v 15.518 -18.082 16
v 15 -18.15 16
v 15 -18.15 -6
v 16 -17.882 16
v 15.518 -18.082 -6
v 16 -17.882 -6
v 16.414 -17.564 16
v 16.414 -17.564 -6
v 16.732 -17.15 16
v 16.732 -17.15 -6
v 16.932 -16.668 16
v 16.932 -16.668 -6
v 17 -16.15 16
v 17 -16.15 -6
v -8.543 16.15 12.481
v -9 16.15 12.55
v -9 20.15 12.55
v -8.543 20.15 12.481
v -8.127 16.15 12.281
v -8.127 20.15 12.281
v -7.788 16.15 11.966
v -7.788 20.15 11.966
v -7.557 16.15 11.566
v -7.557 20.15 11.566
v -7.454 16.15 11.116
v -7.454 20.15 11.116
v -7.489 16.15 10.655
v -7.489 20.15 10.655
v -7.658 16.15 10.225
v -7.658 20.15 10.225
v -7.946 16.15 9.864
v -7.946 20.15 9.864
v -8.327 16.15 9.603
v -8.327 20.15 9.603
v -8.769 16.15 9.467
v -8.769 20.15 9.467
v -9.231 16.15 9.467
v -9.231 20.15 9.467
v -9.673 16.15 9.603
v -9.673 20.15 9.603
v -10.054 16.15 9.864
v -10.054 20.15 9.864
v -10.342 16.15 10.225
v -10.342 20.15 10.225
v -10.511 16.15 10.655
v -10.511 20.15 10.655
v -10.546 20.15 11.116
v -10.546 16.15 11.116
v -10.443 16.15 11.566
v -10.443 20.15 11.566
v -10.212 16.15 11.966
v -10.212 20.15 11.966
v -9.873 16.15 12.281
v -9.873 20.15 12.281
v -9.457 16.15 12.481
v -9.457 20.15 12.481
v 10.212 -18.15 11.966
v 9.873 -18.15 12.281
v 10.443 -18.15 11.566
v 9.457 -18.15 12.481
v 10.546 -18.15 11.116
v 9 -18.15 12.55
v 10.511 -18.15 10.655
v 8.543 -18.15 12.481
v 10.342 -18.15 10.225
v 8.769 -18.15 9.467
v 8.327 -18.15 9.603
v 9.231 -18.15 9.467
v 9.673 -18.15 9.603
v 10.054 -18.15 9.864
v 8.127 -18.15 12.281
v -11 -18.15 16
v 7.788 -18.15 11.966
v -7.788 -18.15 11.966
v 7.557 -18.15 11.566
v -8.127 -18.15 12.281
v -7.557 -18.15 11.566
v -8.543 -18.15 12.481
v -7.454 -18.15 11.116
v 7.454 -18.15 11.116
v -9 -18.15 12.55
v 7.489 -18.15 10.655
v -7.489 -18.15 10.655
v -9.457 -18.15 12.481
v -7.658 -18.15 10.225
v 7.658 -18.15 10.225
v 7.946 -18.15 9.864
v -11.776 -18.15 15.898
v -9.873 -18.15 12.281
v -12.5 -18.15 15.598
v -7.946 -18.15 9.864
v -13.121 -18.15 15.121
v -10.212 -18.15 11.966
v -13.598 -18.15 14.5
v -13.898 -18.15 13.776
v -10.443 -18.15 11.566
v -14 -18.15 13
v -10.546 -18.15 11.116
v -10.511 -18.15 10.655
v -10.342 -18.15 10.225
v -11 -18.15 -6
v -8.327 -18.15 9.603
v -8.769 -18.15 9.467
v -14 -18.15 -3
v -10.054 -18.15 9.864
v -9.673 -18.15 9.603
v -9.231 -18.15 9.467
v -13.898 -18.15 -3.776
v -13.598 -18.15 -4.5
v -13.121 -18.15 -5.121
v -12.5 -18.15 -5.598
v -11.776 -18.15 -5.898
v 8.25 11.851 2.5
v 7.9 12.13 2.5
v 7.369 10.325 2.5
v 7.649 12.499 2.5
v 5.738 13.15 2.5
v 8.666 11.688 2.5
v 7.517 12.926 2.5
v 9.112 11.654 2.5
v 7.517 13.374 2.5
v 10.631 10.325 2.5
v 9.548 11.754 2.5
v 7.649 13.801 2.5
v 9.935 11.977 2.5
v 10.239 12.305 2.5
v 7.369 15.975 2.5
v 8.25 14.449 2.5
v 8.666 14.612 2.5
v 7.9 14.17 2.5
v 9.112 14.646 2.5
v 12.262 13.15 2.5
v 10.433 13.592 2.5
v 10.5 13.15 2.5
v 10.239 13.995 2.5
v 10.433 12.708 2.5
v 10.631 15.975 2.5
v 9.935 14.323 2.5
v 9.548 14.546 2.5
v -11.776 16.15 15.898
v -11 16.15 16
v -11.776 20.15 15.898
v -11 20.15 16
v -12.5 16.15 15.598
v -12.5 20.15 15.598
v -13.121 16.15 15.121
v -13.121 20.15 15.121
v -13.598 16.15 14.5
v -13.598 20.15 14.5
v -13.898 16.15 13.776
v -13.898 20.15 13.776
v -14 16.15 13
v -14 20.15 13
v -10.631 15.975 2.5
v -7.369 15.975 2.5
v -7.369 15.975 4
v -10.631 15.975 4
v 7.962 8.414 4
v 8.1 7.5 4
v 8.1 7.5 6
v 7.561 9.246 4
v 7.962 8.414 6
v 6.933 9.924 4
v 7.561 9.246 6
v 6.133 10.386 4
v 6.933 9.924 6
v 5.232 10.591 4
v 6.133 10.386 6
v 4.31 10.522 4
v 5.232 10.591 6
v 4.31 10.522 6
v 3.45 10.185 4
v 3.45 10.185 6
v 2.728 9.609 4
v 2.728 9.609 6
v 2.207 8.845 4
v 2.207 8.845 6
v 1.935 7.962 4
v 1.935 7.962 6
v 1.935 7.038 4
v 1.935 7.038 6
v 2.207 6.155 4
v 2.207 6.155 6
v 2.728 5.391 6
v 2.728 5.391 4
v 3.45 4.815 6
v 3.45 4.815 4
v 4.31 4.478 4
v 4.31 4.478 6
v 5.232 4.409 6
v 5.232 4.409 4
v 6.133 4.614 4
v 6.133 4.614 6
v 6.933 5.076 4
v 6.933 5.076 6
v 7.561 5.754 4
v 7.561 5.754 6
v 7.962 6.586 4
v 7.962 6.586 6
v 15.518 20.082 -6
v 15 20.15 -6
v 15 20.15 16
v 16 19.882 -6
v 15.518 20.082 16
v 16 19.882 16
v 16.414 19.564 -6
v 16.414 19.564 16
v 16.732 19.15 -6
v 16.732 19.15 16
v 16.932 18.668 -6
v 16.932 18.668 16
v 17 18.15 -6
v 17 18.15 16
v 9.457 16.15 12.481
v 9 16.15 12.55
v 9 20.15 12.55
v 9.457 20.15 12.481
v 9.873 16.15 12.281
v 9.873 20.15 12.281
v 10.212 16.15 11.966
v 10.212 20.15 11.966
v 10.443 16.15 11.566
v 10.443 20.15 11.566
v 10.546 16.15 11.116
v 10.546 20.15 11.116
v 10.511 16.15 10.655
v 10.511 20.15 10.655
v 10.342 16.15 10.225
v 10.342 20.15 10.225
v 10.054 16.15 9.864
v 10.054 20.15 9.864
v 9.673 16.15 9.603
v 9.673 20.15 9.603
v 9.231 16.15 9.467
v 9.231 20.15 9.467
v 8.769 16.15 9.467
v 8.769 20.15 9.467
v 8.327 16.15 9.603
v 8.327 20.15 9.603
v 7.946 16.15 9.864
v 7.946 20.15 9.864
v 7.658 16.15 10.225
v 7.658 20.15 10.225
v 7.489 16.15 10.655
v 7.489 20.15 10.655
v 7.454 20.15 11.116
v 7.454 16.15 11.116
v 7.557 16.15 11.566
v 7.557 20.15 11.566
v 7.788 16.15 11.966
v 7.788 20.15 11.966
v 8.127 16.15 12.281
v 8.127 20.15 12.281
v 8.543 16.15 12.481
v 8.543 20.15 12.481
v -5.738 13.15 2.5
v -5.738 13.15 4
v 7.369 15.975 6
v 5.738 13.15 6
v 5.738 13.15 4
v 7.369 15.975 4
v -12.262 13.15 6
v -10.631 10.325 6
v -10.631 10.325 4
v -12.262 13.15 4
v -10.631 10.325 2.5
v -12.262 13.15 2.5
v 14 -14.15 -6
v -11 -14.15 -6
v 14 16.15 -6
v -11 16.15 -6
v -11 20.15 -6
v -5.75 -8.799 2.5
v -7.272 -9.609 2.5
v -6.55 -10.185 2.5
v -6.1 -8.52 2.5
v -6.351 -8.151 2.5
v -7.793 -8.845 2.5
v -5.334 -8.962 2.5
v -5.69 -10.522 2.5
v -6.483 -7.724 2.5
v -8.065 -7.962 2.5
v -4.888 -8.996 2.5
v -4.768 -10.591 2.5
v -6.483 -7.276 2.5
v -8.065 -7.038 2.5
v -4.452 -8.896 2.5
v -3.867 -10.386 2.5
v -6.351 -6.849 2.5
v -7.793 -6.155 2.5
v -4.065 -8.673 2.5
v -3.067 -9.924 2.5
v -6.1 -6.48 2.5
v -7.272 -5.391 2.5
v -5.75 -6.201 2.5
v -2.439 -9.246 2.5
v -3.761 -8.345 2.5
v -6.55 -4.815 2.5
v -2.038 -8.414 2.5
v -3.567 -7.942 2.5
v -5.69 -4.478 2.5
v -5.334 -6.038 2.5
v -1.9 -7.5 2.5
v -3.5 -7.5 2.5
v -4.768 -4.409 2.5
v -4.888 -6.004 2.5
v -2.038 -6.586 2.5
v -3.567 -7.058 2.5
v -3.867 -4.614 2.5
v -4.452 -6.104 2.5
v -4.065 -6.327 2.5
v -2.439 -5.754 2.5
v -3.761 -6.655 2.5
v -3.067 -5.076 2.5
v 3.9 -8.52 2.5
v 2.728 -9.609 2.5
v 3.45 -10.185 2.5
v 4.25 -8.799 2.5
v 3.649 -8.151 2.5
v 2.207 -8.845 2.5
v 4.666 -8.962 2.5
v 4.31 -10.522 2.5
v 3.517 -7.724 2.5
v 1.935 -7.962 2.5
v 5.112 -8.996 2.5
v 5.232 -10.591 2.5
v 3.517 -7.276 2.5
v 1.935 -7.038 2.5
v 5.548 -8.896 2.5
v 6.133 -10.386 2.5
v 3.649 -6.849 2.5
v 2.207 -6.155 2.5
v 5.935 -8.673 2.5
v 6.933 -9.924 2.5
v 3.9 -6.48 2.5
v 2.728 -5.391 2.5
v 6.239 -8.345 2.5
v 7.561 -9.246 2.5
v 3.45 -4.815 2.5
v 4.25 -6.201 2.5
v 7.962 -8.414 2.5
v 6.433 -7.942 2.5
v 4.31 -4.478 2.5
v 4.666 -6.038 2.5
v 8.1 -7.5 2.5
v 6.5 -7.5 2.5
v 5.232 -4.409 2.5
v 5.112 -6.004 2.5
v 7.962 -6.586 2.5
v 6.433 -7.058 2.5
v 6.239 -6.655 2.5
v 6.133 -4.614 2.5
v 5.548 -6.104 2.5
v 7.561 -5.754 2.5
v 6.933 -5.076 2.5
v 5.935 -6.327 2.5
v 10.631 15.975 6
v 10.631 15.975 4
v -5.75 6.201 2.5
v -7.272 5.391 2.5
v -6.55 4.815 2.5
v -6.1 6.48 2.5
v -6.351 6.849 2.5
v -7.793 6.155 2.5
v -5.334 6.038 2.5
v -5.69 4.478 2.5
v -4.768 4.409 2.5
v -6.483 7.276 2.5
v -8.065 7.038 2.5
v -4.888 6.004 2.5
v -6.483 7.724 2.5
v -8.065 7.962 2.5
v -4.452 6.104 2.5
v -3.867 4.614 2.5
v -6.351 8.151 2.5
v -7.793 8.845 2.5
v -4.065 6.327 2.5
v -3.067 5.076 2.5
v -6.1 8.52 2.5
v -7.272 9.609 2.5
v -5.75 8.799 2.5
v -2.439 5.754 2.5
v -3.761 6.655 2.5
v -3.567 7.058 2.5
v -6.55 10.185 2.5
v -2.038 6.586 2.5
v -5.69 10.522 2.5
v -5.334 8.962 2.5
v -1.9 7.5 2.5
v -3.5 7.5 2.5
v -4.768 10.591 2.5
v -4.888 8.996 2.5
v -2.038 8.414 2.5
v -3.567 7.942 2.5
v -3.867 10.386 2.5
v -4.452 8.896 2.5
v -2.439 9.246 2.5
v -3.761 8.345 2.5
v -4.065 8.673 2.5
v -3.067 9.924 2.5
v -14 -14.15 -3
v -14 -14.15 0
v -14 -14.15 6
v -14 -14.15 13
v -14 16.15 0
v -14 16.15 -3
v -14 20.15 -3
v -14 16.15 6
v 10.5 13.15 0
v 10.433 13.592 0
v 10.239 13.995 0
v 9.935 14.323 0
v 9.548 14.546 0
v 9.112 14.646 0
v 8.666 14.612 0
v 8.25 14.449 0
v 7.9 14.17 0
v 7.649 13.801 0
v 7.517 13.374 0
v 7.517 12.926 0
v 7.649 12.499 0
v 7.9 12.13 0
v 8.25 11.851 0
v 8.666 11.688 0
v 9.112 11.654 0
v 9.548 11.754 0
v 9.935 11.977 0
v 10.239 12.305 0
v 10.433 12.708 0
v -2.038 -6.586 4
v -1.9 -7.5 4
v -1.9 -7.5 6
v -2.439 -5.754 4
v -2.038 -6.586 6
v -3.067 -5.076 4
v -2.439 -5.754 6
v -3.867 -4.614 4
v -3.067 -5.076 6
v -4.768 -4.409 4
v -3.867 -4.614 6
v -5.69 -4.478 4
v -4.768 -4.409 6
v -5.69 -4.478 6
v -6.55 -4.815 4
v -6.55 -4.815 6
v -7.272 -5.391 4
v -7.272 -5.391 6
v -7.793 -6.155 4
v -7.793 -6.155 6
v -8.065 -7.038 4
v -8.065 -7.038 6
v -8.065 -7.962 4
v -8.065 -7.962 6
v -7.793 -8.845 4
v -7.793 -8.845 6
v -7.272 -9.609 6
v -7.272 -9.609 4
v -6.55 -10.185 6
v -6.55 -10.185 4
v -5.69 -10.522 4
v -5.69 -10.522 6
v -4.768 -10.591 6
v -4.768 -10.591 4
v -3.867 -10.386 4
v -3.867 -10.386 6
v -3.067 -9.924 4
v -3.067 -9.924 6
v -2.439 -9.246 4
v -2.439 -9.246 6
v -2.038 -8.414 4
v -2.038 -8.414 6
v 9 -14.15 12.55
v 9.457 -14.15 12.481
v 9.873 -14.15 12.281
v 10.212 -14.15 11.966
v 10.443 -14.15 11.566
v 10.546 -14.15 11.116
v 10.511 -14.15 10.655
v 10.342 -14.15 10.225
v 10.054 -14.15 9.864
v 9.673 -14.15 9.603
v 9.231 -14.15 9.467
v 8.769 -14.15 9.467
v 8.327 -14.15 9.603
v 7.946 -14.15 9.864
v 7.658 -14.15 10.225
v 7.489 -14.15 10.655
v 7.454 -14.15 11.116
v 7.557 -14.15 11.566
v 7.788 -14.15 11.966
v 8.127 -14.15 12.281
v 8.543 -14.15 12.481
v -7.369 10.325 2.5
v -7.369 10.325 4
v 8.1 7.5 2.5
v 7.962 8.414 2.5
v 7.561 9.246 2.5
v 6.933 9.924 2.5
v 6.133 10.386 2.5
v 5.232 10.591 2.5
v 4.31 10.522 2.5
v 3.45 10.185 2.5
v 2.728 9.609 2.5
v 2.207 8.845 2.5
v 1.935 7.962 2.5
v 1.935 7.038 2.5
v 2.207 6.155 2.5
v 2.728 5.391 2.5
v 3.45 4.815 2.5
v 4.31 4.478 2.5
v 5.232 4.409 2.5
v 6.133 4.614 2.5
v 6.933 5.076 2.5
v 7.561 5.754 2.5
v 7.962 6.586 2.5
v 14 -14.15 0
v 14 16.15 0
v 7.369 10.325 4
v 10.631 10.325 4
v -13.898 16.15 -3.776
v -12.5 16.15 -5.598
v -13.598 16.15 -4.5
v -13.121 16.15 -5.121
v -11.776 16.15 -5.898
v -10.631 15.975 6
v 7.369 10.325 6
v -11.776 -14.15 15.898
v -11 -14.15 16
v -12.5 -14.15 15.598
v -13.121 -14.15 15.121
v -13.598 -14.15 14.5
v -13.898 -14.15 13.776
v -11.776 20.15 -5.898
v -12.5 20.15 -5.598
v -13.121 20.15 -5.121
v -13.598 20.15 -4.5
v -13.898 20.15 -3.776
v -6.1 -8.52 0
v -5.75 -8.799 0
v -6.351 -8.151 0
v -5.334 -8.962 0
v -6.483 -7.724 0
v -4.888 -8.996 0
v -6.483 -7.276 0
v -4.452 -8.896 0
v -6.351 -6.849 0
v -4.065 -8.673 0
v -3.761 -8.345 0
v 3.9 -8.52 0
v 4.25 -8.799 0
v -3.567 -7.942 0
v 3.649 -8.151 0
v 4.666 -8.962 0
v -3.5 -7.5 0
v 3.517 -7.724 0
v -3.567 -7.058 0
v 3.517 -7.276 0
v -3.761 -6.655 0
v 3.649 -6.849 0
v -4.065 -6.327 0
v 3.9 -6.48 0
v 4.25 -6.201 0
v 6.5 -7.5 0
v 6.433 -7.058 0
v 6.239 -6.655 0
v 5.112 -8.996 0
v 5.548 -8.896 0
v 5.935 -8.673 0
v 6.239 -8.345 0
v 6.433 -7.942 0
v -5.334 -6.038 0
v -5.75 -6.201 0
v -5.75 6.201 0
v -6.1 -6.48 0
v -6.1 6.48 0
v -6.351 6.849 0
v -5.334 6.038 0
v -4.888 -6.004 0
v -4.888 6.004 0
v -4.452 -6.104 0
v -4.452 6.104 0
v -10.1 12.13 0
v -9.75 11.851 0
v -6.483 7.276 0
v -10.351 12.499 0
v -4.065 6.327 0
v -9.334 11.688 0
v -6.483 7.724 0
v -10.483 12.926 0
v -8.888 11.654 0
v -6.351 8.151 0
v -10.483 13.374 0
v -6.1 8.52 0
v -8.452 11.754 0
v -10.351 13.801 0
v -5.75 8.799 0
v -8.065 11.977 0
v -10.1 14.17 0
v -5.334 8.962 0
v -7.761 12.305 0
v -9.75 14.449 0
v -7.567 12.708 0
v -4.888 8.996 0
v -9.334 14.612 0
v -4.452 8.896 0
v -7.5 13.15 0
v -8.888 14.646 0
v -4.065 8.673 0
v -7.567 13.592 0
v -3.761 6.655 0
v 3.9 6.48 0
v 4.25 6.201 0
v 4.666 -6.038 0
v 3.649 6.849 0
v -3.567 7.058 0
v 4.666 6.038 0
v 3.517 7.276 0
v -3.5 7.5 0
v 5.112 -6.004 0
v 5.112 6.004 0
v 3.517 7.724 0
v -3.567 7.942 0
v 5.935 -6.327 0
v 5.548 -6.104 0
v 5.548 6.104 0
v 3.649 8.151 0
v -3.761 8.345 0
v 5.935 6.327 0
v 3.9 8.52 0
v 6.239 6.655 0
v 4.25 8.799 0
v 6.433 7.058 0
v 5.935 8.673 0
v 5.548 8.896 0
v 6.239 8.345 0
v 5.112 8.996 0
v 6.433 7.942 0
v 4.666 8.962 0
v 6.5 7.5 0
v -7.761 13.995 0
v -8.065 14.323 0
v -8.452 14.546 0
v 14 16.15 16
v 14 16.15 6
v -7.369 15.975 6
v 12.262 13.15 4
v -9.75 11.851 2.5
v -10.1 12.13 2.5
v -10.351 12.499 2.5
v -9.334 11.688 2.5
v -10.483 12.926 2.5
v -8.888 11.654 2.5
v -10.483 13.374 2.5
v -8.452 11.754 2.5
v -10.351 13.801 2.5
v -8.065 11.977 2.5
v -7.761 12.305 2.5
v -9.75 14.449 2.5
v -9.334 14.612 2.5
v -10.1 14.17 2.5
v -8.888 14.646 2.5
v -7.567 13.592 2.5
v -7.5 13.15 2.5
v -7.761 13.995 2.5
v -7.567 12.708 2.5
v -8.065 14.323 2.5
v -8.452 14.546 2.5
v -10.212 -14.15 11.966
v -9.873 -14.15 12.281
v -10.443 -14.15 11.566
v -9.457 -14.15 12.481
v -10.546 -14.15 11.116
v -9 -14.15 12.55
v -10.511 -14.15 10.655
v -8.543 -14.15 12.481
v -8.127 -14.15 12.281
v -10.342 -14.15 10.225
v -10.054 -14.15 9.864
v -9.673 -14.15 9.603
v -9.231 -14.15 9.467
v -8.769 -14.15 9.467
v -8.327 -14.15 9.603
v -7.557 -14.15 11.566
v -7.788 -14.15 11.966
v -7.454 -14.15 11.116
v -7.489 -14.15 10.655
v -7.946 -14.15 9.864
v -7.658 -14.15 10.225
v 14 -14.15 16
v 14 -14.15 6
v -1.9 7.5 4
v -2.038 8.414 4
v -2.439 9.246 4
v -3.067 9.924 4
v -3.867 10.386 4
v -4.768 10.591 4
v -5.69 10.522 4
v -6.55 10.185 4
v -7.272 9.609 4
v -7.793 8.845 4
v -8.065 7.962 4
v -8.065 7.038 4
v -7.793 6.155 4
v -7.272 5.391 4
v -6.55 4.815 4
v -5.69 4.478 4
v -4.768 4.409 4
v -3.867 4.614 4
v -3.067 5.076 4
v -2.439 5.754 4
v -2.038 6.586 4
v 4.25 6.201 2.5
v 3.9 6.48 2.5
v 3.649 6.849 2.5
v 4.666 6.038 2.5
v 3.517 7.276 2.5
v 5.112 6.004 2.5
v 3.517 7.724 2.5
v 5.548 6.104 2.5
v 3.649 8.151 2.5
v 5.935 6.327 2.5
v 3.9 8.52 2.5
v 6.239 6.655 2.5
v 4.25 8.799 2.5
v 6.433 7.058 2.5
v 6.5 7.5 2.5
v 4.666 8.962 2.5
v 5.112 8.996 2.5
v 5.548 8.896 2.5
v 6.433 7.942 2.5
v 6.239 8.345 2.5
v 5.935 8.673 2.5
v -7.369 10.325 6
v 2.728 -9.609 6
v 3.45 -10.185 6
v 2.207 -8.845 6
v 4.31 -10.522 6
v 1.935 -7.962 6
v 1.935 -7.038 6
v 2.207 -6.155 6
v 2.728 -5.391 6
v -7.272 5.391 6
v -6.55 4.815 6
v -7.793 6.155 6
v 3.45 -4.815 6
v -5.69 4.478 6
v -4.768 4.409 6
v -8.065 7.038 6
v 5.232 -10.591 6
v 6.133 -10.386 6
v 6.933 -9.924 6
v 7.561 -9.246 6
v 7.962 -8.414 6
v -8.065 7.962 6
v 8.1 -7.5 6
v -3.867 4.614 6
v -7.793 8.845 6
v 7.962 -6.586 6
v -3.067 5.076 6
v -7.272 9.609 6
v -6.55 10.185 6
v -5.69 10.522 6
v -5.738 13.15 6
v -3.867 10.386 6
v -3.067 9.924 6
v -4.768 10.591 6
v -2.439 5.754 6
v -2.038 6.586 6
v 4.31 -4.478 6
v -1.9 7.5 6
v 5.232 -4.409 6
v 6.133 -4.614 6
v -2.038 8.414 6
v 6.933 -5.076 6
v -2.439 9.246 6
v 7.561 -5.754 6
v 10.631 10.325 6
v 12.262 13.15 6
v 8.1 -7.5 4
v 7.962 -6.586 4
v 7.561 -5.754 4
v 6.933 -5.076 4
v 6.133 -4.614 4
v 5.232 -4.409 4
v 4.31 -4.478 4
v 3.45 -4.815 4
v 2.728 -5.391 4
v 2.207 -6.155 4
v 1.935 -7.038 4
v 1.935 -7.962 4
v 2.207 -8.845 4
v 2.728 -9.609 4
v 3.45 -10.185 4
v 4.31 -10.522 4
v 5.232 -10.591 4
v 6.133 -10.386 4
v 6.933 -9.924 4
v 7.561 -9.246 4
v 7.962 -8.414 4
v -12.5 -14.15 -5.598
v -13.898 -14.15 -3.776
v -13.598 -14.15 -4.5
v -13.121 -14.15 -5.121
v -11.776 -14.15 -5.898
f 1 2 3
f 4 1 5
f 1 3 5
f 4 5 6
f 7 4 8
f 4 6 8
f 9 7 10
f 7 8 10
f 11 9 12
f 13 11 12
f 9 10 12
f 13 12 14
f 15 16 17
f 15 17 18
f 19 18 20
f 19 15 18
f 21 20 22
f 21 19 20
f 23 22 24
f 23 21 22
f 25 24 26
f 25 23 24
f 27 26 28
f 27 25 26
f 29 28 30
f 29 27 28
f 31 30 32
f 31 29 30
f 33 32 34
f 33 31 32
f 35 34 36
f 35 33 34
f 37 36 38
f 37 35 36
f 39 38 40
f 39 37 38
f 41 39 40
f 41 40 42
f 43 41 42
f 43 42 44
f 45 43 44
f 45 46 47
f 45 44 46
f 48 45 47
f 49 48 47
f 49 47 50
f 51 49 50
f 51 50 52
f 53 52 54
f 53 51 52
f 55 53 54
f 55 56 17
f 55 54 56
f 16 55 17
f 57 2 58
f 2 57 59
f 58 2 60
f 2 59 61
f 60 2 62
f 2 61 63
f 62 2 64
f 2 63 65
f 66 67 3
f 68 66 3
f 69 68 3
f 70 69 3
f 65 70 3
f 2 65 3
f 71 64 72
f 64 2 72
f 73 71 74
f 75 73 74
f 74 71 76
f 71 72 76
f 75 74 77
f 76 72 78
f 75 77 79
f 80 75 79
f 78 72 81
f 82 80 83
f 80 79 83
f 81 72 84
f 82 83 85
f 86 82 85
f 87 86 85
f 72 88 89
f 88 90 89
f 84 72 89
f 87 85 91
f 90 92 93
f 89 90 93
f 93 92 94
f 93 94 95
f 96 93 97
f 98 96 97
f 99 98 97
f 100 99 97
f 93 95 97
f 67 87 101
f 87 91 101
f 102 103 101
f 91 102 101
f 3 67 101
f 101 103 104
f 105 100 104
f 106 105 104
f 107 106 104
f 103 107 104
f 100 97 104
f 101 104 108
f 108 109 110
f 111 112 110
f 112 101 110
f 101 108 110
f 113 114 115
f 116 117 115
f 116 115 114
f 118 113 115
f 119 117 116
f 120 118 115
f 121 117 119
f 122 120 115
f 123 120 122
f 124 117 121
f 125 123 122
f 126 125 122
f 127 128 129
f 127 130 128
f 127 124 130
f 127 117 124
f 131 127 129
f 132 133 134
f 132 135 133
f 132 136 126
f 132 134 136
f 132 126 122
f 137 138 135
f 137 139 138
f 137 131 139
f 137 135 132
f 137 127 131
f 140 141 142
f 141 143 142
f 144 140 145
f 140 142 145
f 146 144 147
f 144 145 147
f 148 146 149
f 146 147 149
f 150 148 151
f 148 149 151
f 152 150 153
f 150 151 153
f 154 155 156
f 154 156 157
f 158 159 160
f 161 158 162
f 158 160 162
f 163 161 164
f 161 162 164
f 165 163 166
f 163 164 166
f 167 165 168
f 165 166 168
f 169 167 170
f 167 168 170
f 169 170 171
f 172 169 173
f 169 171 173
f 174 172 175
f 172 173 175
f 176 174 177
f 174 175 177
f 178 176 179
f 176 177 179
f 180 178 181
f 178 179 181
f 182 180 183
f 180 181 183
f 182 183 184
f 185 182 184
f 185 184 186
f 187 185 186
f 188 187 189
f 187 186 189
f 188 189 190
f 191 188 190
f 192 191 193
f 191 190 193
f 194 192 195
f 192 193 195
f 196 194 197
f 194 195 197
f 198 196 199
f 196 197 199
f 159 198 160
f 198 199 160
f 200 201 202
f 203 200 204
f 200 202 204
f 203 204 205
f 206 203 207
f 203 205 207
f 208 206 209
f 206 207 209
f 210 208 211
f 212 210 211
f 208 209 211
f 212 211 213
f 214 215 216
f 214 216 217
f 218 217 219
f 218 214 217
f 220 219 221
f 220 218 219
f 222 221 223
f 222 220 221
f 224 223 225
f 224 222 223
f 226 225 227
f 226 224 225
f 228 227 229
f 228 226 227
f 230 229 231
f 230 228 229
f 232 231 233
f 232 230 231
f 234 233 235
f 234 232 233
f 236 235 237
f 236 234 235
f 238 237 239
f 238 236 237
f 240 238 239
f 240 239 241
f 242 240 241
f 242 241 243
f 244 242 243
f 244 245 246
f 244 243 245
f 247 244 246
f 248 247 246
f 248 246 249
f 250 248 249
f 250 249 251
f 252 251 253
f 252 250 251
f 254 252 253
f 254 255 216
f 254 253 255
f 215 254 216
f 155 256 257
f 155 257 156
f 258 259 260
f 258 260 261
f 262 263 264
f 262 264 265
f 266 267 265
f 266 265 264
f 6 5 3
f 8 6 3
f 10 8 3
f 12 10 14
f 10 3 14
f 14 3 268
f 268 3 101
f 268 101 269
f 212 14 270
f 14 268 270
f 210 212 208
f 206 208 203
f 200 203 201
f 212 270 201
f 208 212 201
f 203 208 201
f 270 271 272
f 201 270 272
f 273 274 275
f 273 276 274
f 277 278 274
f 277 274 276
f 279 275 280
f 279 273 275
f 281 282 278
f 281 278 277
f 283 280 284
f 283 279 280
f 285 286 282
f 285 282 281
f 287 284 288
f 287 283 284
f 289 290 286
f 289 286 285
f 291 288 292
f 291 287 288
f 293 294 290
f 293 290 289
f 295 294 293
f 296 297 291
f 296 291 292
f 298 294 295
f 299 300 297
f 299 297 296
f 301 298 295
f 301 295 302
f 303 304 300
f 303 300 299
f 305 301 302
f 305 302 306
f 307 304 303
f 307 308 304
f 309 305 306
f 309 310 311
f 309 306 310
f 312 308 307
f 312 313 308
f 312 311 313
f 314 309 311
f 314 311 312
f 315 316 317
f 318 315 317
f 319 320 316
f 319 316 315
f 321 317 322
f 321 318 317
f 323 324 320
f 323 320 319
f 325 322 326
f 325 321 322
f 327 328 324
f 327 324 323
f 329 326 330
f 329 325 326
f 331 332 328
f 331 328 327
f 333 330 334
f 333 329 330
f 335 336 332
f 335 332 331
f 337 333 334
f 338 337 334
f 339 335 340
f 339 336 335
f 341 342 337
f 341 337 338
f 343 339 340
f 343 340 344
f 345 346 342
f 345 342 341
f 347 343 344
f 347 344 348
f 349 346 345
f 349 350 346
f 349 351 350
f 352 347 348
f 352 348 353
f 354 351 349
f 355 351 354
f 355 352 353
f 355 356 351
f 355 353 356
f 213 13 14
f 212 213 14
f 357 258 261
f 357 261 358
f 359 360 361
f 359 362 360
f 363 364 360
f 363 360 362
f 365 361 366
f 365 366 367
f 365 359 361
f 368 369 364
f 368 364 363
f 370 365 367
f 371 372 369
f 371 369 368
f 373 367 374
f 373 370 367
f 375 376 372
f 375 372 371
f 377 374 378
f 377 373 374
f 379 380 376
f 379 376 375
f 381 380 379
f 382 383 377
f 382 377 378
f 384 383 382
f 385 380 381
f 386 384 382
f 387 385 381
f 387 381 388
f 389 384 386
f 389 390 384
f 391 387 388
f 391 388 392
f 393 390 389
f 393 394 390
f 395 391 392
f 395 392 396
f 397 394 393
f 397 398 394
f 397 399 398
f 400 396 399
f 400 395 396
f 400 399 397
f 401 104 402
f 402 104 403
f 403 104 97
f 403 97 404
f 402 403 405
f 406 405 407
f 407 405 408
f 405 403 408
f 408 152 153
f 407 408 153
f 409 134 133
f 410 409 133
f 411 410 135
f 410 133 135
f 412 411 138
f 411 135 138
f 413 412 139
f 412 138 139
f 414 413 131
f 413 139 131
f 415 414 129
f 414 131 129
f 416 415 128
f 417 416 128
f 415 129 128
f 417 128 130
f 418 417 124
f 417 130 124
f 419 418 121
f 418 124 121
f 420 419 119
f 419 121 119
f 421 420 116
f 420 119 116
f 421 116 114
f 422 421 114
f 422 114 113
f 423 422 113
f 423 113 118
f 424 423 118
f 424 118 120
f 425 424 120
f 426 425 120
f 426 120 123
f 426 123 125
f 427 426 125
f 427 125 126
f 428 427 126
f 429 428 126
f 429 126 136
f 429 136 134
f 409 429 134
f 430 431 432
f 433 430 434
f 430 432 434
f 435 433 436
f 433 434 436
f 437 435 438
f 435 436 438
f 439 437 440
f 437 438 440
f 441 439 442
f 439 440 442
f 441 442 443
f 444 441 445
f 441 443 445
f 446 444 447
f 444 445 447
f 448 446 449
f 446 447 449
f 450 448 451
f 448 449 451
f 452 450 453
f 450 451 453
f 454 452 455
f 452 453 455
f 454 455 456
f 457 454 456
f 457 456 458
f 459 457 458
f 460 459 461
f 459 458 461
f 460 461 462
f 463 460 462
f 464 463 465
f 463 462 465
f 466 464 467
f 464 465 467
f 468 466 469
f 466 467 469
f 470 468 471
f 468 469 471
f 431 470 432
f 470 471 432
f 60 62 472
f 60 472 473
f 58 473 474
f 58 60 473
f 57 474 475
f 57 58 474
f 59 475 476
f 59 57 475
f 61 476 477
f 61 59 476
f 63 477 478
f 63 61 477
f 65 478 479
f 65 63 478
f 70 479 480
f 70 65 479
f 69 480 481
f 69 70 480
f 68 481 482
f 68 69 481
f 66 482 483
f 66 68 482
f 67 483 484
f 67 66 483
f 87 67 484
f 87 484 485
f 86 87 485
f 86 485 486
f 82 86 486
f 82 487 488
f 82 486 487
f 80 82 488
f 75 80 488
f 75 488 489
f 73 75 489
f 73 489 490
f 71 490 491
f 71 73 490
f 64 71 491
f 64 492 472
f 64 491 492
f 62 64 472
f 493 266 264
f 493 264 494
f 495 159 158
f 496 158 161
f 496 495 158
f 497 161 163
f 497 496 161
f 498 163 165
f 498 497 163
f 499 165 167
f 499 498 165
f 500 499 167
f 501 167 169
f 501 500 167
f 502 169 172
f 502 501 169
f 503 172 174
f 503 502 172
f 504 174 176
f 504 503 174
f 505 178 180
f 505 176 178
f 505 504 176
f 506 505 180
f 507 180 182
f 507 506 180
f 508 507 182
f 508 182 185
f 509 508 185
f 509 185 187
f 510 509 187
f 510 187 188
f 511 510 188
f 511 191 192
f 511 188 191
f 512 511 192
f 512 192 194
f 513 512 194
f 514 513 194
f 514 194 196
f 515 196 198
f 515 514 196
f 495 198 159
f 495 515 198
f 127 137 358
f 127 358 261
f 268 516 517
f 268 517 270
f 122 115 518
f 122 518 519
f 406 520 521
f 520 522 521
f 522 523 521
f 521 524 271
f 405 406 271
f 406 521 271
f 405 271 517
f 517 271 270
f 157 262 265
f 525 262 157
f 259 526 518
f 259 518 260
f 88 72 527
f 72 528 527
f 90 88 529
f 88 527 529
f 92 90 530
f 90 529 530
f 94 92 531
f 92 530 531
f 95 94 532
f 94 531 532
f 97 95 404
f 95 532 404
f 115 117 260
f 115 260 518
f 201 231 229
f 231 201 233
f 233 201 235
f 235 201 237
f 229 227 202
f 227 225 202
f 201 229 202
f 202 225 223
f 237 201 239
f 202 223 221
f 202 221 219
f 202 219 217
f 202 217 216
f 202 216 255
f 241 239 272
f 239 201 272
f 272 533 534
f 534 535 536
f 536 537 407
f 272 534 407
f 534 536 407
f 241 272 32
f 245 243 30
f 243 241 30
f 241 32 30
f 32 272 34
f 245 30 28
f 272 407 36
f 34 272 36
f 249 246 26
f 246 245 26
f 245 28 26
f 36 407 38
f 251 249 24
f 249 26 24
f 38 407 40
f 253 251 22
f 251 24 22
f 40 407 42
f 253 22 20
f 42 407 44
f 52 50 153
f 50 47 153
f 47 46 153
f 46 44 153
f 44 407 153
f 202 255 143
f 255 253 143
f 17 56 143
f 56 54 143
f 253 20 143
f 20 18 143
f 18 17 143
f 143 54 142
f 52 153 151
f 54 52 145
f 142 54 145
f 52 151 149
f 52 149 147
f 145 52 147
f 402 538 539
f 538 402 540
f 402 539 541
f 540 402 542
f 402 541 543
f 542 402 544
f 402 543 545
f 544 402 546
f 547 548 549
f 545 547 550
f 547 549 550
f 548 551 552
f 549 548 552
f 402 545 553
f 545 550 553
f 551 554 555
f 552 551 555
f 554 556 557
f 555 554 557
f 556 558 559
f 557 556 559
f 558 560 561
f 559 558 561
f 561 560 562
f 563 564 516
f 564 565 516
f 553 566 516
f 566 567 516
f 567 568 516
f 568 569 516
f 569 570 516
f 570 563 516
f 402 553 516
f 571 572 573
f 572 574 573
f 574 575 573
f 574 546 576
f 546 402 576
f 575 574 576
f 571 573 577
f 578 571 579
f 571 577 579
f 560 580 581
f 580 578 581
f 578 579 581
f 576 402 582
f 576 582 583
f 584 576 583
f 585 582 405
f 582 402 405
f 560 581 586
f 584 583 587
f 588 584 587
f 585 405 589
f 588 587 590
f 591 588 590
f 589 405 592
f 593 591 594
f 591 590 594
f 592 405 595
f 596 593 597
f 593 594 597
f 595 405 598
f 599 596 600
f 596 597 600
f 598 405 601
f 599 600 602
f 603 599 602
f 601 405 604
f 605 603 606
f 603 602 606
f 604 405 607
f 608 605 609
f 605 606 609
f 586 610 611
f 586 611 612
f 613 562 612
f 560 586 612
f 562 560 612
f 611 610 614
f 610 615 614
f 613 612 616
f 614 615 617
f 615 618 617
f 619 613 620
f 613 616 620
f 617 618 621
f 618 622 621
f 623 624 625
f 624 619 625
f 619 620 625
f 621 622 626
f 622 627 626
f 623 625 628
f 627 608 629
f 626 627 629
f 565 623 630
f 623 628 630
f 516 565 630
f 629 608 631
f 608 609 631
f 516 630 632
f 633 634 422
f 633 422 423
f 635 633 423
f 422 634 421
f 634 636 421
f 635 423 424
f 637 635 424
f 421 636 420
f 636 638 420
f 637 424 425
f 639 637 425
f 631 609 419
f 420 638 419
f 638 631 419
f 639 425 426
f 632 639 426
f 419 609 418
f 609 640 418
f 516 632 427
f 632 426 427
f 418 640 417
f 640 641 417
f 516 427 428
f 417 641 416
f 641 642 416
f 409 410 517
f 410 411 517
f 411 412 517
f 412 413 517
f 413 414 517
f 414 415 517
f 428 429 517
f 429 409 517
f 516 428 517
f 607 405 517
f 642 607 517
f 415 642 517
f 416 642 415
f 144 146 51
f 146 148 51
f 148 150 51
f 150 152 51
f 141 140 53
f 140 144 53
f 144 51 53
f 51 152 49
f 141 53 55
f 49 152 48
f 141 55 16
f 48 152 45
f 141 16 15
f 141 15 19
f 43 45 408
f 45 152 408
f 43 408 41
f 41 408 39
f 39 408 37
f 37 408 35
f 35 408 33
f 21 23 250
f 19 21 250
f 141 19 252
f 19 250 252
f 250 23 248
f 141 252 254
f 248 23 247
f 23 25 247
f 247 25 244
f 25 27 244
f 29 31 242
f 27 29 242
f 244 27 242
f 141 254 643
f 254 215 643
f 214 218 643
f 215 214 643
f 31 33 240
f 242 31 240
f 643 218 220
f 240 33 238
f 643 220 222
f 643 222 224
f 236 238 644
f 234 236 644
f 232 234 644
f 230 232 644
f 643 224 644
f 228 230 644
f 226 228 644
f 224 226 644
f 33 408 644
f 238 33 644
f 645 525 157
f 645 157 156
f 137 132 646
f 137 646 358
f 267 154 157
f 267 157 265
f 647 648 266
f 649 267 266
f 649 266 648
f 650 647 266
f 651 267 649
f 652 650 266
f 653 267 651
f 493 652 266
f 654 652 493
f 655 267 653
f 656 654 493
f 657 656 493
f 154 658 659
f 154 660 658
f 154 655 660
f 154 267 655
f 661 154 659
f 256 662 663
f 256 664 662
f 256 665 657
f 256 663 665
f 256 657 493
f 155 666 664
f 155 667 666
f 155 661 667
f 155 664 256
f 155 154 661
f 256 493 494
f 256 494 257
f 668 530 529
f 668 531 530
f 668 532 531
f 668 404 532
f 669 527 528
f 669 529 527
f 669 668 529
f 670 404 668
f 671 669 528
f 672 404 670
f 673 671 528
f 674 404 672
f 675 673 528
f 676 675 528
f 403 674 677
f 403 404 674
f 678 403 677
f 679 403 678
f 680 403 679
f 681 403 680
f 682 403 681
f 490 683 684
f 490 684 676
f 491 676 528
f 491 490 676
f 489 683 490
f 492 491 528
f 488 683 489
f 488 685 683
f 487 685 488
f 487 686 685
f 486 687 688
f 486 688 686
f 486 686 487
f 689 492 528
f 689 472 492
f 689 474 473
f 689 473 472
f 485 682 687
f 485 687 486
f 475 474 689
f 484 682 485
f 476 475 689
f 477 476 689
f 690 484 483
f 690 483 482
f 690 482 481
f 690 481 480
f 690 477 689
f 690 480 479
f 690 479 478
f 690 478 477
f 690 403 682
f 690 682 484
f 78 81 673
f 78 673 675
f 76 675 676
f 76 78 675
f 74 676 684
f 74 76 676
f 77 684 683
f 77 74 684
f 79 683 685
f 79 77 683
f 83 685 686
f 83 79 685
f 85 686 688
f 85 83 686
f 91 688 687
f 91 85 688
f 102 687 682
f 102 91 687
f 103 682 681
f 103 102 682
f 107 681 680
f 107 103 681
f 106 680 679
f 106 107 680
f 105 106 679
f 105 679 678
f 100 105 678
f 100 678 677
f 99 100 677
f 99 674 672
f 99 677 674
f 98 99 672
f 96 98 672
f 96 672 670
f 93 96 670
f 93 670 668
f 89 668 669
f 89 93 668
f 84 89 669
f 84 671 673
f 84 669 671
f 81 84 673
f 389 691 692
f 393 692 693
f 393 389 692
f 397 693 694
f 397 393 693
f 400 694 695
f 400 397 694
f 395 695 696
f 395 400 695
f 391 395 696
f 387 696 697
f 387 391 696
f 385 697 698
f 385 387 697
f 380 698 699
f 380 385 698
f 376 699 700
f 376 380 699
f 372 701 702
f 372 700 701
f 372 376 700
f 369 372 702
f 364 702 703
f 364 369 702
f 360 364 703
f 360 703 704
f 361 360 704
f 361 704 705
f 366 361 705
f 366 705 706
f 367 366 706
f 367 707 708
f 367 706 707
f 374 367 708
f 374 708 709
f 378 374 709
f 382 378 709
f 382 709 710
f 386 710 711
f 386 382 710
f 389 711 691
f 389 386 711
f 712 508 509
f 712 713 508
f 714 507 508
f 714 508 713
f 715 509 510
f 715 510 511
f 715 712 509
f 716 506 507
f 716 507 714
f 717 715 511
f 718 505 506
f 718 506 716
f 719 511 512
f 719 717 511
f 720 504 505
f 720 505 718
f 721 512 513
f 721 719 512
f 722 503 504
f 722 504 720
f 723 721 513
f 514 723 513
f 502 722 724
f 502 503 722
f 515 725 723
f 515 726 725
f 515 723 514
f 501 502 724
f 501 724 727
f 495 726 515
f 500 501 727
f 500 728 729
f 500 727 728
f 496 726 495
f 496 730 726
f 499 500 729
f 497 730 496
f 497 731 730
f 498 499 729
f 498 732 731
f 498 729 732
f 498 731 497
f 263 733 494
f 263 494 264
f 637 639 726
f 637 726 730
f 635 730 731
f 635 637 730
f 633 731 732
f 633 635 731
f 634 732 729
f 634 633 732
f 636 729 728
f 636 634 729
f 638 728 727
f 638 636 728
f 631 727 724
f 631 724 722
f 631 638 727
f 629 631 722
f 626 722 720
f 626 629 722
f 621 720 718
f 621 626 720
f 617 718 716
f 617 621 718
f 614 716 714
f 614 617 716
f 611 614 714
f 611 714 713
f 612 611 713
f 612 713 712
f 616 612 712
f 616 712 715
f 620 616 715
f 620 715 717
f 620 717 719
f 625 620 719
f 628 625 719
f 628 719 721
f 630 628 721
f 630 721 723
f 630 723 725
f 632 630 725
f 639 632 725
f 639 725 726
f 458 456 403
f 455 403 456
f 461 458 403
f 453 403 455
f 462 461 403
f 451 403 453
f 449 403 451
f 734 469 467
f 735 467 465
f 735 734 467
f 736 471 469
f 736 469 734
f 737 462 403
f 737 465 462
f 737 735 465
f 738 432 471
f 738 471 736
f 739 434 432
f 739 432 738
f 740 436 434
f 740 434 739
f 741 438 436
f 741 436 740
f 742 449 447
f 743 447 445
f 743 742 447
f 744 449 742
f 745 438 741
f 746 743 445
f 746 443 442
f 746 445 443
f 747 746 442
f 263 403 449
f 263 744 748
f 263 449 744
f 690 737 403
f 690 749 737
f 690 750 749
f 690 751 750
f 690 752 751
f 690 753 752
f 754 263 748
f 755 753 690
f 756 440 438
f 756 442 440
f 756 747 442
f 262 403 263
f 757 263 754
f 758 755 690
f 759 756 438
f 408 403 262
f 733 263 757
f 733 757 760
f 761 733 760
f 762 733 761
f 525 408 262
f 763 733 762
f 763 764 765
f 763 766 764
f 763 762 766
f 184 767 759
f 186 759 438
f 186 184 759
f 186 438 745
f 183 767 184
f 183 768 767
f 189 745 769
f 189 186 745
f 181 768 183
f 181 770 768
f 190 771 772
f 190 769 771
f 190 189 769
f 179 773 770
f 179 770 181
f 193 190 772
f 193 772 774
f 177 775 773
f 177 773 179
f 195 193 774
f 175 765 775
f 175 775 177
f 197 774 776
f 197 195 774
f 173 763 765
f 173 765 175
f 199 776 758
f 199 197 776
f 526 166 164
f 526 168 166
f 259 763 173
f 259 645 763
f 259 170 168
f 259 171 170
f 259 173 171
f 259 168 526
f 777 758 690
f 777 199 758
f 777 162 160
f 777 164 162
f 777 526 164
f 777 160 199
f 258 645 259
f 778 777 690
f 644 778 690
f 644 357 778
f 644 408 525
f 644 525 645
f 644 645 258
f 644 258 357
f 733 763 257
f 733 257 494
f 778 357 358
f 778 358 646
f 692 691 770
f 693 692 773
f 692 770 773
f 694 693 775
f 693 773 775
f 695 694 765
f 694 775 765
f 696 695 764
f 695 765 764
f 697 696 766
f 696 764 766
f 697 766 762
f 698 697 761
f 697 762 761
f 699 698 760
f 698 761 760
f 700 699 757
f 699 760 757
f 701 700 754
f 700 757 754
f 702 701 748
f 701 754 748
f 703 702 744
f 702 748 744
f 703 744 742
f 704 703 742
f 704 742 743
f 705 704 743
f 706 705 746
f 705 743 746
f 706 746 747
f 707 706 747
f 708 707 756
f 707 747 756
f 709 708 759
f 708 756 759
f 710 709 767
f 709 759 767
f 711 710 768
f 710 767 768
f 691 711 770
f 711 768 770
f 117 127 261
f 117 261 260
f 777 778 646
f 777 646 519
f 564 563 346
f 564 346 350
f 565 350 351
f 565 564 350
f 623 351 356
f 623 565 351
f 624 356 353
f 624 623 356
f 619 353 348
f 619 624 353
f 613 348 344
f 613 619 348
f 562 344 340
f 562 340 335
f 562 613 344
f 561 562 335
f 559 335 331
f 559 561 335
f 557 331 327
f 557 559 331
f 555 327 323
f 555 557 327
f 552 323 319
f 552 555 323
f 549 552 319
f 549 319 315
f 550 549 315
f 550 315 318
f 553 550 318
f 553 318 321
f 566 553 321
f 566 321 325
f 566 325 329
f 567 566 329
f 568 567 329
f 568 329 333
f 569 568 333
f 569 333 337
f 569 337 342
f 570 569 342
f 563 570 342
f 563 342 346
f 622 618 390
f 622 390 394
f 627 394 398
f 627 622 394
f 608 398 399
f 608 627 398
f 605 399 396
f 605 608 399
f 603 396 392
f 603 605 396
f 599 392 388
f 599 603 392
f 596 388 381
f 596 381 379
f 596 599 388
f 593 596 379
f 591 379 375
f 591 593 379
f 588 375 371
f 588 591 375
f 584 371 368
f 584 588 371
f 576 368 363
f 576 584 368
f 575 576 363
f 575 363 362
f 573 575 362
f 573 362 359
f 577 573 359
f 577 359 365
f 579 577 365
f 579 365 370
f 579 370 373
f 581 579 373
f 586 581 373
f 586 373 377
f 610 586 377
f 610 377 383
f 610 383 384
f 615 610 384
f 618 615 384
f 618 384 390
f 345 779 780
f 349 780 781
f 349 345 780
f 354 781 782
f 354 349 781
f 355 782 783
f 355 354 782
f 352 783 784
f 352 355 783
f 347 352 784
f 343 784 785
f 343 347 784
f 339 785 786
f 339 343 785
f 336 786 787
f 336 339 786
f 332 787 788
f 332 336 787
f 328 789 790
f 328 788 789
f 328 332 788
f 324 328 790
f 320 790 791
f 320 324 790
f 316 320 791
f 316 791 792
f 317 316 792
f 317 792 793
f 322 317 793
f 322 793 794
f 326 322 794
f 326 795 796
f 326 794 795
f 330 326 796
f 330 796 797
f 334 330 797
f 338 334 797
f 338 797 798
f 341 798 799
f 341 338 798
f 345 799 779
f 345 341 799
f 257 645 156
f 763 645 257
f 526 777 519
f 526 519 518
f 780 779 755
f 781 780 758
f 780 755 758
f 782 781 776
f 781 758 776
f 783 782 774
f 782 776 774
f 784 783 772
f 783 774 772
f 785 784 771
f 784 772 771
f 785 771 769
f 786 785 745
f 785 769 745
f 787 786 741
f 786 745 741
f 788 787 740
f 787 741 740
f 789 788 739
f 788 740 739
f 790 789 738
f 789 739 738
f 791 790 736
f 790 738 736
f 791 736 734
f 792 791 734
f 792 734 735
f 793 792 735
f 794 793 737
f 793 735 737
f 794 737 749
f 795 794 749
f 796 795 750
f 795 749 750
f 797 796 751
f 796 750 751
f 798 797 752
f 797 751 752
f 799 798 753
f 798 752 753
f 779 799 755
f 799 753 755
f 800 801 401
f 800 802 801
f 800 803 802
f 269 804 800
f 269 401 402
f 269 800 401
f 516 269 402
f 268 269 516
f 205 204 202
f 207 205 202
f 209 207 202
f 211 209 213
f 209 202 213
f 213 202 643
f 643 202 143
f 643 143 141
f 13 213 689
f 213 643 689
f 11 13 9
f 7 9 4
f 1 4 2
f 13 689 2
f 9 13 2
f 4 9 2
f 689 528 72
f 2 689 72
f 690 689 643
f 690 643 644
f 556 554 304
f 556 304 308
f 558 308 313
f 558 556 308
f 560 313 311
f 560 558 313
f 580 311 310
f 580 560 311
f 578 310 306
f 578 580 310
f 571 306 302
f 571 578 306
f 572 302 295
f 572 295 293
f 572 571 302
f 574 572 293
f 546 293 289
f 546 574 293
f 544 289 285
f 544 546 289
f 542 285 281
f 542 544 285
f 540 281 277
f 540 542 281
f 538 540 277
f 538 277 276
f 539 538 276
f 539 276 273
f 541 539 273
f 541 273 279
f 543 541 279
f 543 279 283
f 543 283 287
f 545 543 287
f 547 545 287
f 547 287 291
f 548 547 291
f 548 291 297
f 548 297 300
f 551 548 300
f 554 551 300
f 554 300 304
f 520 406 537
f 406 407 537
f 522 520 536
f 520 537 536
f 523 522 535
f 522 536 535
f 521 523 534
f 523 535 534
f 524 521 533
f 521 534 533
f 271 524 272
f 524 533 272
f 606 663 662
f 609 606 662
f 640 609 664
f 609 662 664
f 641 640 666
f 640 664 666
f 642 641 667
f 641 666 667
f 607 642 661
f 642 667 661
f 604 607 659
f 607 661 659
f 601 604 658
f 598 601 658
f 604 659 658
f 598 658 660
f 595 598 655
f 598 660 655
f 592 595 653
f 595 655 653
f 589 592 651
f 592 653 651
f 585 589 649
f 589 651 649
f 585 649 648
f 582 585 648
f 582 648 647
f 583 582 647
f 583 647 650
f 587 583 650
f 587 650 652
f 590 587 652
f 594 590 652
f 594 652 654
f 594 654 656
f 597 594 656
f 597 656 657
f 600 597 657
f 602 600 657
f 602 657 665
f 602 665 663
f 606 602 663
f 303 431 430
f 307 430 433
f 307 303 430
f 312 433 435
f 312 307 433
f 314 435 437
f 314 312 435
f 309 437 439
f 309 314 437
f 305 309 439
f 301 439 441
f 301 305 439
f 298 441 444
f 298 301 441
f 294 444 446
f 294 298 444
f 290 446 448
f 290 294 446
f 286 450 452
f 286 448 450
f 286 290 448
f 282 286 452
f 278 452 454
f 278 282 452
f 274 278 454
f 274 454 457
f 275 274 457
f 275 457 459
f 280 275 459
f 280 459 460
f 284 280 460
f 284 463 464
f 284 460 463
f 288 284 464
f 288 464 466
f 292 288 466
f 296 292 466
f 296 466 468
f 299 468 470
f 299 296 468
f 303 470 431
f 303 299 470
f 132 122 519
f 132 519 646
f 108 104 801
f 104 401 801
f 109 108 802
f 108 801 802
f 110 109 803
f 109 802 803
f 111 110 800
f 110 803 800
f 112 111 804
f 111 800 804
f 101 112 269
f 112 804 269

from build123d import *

# Parameters (mm, degrees)
SKETCH_1_W               = 28
SKETCH_1_H               = 20.3
SKETCH_1_R               = 1.5
EXTRUDE_1_DEPTH          = 5
SKETCH_2_W               = 28
SKETCH_2_H               = 6
SKETCH_2_H_2             = 4
EXTRUDE_2_DEPTH          = 10
SKETCH_3_W               = 28
SKETCH_3_H               = 6
EXTRUDE_3_DEPTH          = 5
SKETCH_4_R               = 1.5
CUT_EXTRUDE_1_DEPTH      = 27.11173108
SKETCH_5_W               = 10
SKETCH_5_H               = 6
SKETCH_5_W_2             = 5
SKETCH_5_H_2             = 4
CUT_EXTRUDE_2_DEPTH      = 34.835225727
SKETCH_6_W               = 28
SKETCH_6_H               = 30.3
CUT_EXTRUDE_3_DEPTH      = 1
EXTRUDE_4_DEPTH          = 12
EXTRUDE_4_DEPTH_BACK     = 10
SKETCH_7_W               = 28
SKETCH_7_H               = 4
CUT_EXTRUDE_4_DEPTH      = 28.313412456
CUT_EXTRUDE_4_DEPTH_BACK = 1.5
SKETCH_9_R               = 3.1
SKETCH_9_R_2             = 1.5
CUT_EXTRUDE_5_DEPTH      = 41.354553646
CUT_EXTRUDE_5_DEPTH_BACK = 41.354553646
SKETCH_10_R              = 1.55
SKETCH_11_W              = 12
SKETCH_11_H              = 30.3
SKETCH_11_W_2            = 6
EXTRUDE_5_DEPTH          = 3
FILLET_1_R               = 2
FILLET_2_R               = 3
EXTRUDE_START            = 2
SKETCH_13_W              = 28
SKETCH_13_H              = 30.3
SKETCH_13_R              = 3.1
EXTRUDE_6_DEPTH          = 2


with BuildPart() as part:
    # 草图1 → 凸台-拉伸1 (new body)
    with BuildSketch(Plane.XY):
        Rectangle(SKETCH_1_W, SKETCH_1_H)
        with Locations((-5, 7.5)):
            Circle(SKETCH_1_R, mode=Mode.SUBTRACT)
        with Locations((5, 7.5)):
            Circle(SKETCH_1_R, mode=Mode.SUBTRACT)
        with Locations((5, -7.5)):
            Circle(SKETCH_1_R, mode=Mode.SUBTRACT)
        with Locations((-5, -7.5)):
            Circle(SKETCH_1_R, mode=Mode.SUBTRACT)
    extrude(amount=EXTRUDE_1_DEPTH)

    # 草图2 → 凸台-拉伸2 (add)
    with BuildSketch(Plane.XY.offset(5)):
        with Locations((0, 13.15)):
            Rectangle(SKETCH_2_W, SKETCH_2_H)
        with Locations((0, -12.15)):
            Rectangle(SKETCH_2_W, SKETCH_2_H_2)
    extrude(amount=-EXTRUDE_2_DEPTH)

    # 草图3 → 凸台-拉伸3 (add)
    with BuildSketch(Plane(origin=(0, 0, -5), x_dir=(-1, 0, 0), z_dir=(0, 0, -1))):
        with Locations((0, 13.15)):
            Rectangle(SKETCH_3_W, SKETCH_3_H)
    extrude(amount=EXTRUDE_3_DEPTH)

    # 草图4 → 切除-拉伸1 (cut, through all)
    with BuildSketch(Plane.XY.offset(5)):
        with Locations((-9, 13.15)):
            Circle(SKETCH_4_R)
        with Locations((9, 13.15)):
            Circle(SKETCH_4_R)
    extrude(amount=-CUT_EXTRUDE_1_DEPTH, mode=Mode.SUBTRACT)

    # 草图5 → 切除-拉伸2 (cut, through all)
    with BuildSketch(Plane.ZY.offset(14)):
        with Locations((-5, 13.15)):
            Rectangle(SKETCH_5_W, SKETCH_5_H)
        with Locations((-2.5, -12.15)):
            Rectangle(SKETCH_5_W_2, SKETCH_5_H_2)
    extrude(amount=-CUT_EXTRUDE_2_DEPTH, mode=Mode.SUBTRACT)

    # 草图6 → 切除-拉伸3 (cut)
    with BuildSketch(Plane.XY.offset(5)):
        with Locations((0, 1)):
            Rectangle(SKETCH_6_W, SKETCH_6_H)
    extrude(amount=-CUT_EXTRUDE_3_DEPTH, mode=Mode.SUBTRACT)

    # 草图7 → 凸台-拉伸4 (add, two sides: drawn at the far end of the back side and taken through both)
    with BuildSketch(Plane.XY.offset(4).offset(-EXTRUDE_4_DEPTH_BACK)):
        with Locations((0, 18.15)):
            Rectangle(SKETCH_7_W, SKETCH_7_H)
        with Locations((0, -16.15)):
            Rectangle(SKETCH_7_W, SKETCH_7_H)
    extrude(amount=EXTRUDE_4_DEPTH + EXTRUDE_4_DEPTH_BACK)

    # 草图9 → 切除-拉伸4 (cut, two sides: drawn at the far end of the back side and taken through both)
    # profile 1 of 6: a face of its own
    with BuildSketch(Plane.XY.offset(4).offset(-CUT_EXTRUDE_4_DEPTH_BACK)):
        with Locations((-5, 7.5)):
            Circle(SKETCH_9_R)
        with Locations((-5, 7.5)):
            Circle(SKETCH_9_R_2, mode=Mode.SUBTRACT)
    # profile 2 of 6: a face of its own
    with BuildSketch(Plane.XY.offset(4).offset(-CUT_EXTRUDE_4_DEPTH_BACK)):
        with Locations((5, 7.5)):
            Circle(SKETCH_9_R)
        with Locations((5, 7.5)):
            Circle(SKETCH_9_R_2, mode=Mode.SUBTRACT)
    # profile 3 of 6: a face of its own
    with BuildSketch(Plane.XY.offset(4).offset(-CUT_EXTRUDE_4_DEPTH_BACK)):
        with Locations((5, -7.5)):
            Circle(SKETCH_9_R)
        with Locations((5, -7.5)):
            Circle(SKETCH_9_R_2, mode=Mode.SUBTRACT)
    # profile 4 of 6: a face of its own
    with BuildSketch(Plane.XY.offset(4).offset(-CUT_EXTRUDE_4_DEPTH_BACK)):
        with Locations((-5, -7.5)):
            Circle(SKETCH_9_R)
        with Locations((-5, -7.5)):
            Circle(SKETCH_9_R_2, mode=Mode.SUBTRACT)
    # profile 5 of 6: a face of its own
    with BuildSketch(Plane.XY.offset(4).offset(-CUT_EXTRUDE_4_DEPTH_BACK)):
        Polygon((-7.36898549, 10.325), (-5.737970979, 13.15), (-7.36898549, 15.975), (-10.63101451, 15.975), (-12.262029021, 13.15), (-10.63101451, 10.325), align=None)
        with Locations((-9, 13.15)):
            Circle(SKETCH_9_R_2, mode=Mode.SUBTRACT)
    # profile 6 of 6: a face of its own
    with BuildSketch(Plane.XY.offset(4).offset(-CUT_EXTRUDE_4_DEPTH_BACK)):
        Polygon((10.63101451, 10.325), (12.262029021, 13.15), (10.63101451, 15.975), (7.36898549, 15.975), (5.737970979, 13.15), (7.36898549, 10.325), align=None)
        with Locations((9, 13.15)):
            Circle(SKETCH_9_R_2, mode=Mode.SUBTRACT)
    extrude(amount=CUT_EXTRUDE_4_DEPTH + CUT_EXTRUDE_4_DEPTH_BACK, mode=Mode.SUBTRACT)

    # 草图10 → 切除-拉伸5 (cut, two sides: drawn at the far end of the back side and taken through both)
    with BuildSketch(Plane(origin=(0, -14.15, 0), x_dir=(1, 0, 0), z_dir=(0, 1, 0)).offset(-CUT_EXTRUDE_5_DEPTH_BACK)):
        with Locations(Location((-9, -11, 0), (0, 0, 270))):
            Circle(SKETCH_10_R)
        with Locations(Location((9, -11, 0), (0, 0, 270))):
            Circle(SKETCH_10_R)
    extrude(amount=CUT_EXTRUDE_5_DEPTH + CUT_EXTRUDE_5_DEPTH_BACK, mode=Mode.SUBTRACT)

    # 草图11 → 凸台-拉伸5 (add)
    with BuildSketch(Plane(origin=(14, 0, 0), x_dir=(0, 0, -1), z_dir=(1, 0, 0))):
        Polygon((-16, 16.15), (-4, 16.15), (-4, -14.15), (-16, -14.15), (-16, -18.15), (6, -18.15), (6, -14.15), (0, -14.15), (0, 16.15), (6, 16.15), (6, 20.15), (-16, 20.15), align=None)
        with Locations((-10, 1)):
            Rectangle(SKETCH_11_W, SKETCH_11_H)
        with Locations((3, 1)):
            Rectangle(SKETCH_11_W_2, SKETCH_11_H)
    extrude(amount=EXTRUDE_5_DEPTH)

    # 圆角1
    fillet_1_edges = [part.edges().sort_by_distance(p)[0] for p in [
        (17, 20.15, 5),
        (17, -18.15, 5),
    ]]
    fillet(fillet_1_edges, radius=FILLET_1_R)

    # 圆角2
    fillet_2_edges = [part.edges().sort_by_distance(p)[0] for p in [
        (-14, 18.15, 16),
        (-14, 18.15, -6),
        (-14, -16.15, -6),
        (-14, -16.15, 16),
    ]]
    fillet(fillet_2_edges, radius=FILLET_2_R)

    # 草图13 → 凸台-拉伸6 (add)
    with BuildSketch(Plane.XY.offset(4).offset(EXTRUDE_START)):
        with Locations((0, 1)):
            Rectangle(SKETCH_13_W, SKETCH_13_H)
        with Locations((5, -7.5)):
            Circle(SKETCH_13_R, mode=Mode.SUBTRACT)
        with Locations((-5, -7.5)):
            Circle(SKETCH_13_R, mode=Mode.SUBTRACT)
        with Locations((5, 7.5)):
            Circle(SKETCH_13_R, mode=Mode.SUBTRACT)
        with Locations((-5, 7.5)):
            Circle(SKETCH_13_R, mode=Mode.SUBTRACT)
        Polygon((-10.63101451, 15.975), (-7.36898549, 15.975), (-5.737970979, 13.15), (-7.36898549, 10.325), (-10.63101451, 10.325), (-12.262029021, 13.15), align=None, mode=Mode.SUBTRACT)
        Polygon((10.63101451, 10.325), (7.36898549, 10.325), (5.737970979, 13.15), (7.36898549, 15.975), (10.63101451, 15.975), (12.262029021, 13.15), align=None, mode=Mode.SUBTRACT)
    extrude(amount=-EXTRUDE_6_DEPTH)


solid = part.part
